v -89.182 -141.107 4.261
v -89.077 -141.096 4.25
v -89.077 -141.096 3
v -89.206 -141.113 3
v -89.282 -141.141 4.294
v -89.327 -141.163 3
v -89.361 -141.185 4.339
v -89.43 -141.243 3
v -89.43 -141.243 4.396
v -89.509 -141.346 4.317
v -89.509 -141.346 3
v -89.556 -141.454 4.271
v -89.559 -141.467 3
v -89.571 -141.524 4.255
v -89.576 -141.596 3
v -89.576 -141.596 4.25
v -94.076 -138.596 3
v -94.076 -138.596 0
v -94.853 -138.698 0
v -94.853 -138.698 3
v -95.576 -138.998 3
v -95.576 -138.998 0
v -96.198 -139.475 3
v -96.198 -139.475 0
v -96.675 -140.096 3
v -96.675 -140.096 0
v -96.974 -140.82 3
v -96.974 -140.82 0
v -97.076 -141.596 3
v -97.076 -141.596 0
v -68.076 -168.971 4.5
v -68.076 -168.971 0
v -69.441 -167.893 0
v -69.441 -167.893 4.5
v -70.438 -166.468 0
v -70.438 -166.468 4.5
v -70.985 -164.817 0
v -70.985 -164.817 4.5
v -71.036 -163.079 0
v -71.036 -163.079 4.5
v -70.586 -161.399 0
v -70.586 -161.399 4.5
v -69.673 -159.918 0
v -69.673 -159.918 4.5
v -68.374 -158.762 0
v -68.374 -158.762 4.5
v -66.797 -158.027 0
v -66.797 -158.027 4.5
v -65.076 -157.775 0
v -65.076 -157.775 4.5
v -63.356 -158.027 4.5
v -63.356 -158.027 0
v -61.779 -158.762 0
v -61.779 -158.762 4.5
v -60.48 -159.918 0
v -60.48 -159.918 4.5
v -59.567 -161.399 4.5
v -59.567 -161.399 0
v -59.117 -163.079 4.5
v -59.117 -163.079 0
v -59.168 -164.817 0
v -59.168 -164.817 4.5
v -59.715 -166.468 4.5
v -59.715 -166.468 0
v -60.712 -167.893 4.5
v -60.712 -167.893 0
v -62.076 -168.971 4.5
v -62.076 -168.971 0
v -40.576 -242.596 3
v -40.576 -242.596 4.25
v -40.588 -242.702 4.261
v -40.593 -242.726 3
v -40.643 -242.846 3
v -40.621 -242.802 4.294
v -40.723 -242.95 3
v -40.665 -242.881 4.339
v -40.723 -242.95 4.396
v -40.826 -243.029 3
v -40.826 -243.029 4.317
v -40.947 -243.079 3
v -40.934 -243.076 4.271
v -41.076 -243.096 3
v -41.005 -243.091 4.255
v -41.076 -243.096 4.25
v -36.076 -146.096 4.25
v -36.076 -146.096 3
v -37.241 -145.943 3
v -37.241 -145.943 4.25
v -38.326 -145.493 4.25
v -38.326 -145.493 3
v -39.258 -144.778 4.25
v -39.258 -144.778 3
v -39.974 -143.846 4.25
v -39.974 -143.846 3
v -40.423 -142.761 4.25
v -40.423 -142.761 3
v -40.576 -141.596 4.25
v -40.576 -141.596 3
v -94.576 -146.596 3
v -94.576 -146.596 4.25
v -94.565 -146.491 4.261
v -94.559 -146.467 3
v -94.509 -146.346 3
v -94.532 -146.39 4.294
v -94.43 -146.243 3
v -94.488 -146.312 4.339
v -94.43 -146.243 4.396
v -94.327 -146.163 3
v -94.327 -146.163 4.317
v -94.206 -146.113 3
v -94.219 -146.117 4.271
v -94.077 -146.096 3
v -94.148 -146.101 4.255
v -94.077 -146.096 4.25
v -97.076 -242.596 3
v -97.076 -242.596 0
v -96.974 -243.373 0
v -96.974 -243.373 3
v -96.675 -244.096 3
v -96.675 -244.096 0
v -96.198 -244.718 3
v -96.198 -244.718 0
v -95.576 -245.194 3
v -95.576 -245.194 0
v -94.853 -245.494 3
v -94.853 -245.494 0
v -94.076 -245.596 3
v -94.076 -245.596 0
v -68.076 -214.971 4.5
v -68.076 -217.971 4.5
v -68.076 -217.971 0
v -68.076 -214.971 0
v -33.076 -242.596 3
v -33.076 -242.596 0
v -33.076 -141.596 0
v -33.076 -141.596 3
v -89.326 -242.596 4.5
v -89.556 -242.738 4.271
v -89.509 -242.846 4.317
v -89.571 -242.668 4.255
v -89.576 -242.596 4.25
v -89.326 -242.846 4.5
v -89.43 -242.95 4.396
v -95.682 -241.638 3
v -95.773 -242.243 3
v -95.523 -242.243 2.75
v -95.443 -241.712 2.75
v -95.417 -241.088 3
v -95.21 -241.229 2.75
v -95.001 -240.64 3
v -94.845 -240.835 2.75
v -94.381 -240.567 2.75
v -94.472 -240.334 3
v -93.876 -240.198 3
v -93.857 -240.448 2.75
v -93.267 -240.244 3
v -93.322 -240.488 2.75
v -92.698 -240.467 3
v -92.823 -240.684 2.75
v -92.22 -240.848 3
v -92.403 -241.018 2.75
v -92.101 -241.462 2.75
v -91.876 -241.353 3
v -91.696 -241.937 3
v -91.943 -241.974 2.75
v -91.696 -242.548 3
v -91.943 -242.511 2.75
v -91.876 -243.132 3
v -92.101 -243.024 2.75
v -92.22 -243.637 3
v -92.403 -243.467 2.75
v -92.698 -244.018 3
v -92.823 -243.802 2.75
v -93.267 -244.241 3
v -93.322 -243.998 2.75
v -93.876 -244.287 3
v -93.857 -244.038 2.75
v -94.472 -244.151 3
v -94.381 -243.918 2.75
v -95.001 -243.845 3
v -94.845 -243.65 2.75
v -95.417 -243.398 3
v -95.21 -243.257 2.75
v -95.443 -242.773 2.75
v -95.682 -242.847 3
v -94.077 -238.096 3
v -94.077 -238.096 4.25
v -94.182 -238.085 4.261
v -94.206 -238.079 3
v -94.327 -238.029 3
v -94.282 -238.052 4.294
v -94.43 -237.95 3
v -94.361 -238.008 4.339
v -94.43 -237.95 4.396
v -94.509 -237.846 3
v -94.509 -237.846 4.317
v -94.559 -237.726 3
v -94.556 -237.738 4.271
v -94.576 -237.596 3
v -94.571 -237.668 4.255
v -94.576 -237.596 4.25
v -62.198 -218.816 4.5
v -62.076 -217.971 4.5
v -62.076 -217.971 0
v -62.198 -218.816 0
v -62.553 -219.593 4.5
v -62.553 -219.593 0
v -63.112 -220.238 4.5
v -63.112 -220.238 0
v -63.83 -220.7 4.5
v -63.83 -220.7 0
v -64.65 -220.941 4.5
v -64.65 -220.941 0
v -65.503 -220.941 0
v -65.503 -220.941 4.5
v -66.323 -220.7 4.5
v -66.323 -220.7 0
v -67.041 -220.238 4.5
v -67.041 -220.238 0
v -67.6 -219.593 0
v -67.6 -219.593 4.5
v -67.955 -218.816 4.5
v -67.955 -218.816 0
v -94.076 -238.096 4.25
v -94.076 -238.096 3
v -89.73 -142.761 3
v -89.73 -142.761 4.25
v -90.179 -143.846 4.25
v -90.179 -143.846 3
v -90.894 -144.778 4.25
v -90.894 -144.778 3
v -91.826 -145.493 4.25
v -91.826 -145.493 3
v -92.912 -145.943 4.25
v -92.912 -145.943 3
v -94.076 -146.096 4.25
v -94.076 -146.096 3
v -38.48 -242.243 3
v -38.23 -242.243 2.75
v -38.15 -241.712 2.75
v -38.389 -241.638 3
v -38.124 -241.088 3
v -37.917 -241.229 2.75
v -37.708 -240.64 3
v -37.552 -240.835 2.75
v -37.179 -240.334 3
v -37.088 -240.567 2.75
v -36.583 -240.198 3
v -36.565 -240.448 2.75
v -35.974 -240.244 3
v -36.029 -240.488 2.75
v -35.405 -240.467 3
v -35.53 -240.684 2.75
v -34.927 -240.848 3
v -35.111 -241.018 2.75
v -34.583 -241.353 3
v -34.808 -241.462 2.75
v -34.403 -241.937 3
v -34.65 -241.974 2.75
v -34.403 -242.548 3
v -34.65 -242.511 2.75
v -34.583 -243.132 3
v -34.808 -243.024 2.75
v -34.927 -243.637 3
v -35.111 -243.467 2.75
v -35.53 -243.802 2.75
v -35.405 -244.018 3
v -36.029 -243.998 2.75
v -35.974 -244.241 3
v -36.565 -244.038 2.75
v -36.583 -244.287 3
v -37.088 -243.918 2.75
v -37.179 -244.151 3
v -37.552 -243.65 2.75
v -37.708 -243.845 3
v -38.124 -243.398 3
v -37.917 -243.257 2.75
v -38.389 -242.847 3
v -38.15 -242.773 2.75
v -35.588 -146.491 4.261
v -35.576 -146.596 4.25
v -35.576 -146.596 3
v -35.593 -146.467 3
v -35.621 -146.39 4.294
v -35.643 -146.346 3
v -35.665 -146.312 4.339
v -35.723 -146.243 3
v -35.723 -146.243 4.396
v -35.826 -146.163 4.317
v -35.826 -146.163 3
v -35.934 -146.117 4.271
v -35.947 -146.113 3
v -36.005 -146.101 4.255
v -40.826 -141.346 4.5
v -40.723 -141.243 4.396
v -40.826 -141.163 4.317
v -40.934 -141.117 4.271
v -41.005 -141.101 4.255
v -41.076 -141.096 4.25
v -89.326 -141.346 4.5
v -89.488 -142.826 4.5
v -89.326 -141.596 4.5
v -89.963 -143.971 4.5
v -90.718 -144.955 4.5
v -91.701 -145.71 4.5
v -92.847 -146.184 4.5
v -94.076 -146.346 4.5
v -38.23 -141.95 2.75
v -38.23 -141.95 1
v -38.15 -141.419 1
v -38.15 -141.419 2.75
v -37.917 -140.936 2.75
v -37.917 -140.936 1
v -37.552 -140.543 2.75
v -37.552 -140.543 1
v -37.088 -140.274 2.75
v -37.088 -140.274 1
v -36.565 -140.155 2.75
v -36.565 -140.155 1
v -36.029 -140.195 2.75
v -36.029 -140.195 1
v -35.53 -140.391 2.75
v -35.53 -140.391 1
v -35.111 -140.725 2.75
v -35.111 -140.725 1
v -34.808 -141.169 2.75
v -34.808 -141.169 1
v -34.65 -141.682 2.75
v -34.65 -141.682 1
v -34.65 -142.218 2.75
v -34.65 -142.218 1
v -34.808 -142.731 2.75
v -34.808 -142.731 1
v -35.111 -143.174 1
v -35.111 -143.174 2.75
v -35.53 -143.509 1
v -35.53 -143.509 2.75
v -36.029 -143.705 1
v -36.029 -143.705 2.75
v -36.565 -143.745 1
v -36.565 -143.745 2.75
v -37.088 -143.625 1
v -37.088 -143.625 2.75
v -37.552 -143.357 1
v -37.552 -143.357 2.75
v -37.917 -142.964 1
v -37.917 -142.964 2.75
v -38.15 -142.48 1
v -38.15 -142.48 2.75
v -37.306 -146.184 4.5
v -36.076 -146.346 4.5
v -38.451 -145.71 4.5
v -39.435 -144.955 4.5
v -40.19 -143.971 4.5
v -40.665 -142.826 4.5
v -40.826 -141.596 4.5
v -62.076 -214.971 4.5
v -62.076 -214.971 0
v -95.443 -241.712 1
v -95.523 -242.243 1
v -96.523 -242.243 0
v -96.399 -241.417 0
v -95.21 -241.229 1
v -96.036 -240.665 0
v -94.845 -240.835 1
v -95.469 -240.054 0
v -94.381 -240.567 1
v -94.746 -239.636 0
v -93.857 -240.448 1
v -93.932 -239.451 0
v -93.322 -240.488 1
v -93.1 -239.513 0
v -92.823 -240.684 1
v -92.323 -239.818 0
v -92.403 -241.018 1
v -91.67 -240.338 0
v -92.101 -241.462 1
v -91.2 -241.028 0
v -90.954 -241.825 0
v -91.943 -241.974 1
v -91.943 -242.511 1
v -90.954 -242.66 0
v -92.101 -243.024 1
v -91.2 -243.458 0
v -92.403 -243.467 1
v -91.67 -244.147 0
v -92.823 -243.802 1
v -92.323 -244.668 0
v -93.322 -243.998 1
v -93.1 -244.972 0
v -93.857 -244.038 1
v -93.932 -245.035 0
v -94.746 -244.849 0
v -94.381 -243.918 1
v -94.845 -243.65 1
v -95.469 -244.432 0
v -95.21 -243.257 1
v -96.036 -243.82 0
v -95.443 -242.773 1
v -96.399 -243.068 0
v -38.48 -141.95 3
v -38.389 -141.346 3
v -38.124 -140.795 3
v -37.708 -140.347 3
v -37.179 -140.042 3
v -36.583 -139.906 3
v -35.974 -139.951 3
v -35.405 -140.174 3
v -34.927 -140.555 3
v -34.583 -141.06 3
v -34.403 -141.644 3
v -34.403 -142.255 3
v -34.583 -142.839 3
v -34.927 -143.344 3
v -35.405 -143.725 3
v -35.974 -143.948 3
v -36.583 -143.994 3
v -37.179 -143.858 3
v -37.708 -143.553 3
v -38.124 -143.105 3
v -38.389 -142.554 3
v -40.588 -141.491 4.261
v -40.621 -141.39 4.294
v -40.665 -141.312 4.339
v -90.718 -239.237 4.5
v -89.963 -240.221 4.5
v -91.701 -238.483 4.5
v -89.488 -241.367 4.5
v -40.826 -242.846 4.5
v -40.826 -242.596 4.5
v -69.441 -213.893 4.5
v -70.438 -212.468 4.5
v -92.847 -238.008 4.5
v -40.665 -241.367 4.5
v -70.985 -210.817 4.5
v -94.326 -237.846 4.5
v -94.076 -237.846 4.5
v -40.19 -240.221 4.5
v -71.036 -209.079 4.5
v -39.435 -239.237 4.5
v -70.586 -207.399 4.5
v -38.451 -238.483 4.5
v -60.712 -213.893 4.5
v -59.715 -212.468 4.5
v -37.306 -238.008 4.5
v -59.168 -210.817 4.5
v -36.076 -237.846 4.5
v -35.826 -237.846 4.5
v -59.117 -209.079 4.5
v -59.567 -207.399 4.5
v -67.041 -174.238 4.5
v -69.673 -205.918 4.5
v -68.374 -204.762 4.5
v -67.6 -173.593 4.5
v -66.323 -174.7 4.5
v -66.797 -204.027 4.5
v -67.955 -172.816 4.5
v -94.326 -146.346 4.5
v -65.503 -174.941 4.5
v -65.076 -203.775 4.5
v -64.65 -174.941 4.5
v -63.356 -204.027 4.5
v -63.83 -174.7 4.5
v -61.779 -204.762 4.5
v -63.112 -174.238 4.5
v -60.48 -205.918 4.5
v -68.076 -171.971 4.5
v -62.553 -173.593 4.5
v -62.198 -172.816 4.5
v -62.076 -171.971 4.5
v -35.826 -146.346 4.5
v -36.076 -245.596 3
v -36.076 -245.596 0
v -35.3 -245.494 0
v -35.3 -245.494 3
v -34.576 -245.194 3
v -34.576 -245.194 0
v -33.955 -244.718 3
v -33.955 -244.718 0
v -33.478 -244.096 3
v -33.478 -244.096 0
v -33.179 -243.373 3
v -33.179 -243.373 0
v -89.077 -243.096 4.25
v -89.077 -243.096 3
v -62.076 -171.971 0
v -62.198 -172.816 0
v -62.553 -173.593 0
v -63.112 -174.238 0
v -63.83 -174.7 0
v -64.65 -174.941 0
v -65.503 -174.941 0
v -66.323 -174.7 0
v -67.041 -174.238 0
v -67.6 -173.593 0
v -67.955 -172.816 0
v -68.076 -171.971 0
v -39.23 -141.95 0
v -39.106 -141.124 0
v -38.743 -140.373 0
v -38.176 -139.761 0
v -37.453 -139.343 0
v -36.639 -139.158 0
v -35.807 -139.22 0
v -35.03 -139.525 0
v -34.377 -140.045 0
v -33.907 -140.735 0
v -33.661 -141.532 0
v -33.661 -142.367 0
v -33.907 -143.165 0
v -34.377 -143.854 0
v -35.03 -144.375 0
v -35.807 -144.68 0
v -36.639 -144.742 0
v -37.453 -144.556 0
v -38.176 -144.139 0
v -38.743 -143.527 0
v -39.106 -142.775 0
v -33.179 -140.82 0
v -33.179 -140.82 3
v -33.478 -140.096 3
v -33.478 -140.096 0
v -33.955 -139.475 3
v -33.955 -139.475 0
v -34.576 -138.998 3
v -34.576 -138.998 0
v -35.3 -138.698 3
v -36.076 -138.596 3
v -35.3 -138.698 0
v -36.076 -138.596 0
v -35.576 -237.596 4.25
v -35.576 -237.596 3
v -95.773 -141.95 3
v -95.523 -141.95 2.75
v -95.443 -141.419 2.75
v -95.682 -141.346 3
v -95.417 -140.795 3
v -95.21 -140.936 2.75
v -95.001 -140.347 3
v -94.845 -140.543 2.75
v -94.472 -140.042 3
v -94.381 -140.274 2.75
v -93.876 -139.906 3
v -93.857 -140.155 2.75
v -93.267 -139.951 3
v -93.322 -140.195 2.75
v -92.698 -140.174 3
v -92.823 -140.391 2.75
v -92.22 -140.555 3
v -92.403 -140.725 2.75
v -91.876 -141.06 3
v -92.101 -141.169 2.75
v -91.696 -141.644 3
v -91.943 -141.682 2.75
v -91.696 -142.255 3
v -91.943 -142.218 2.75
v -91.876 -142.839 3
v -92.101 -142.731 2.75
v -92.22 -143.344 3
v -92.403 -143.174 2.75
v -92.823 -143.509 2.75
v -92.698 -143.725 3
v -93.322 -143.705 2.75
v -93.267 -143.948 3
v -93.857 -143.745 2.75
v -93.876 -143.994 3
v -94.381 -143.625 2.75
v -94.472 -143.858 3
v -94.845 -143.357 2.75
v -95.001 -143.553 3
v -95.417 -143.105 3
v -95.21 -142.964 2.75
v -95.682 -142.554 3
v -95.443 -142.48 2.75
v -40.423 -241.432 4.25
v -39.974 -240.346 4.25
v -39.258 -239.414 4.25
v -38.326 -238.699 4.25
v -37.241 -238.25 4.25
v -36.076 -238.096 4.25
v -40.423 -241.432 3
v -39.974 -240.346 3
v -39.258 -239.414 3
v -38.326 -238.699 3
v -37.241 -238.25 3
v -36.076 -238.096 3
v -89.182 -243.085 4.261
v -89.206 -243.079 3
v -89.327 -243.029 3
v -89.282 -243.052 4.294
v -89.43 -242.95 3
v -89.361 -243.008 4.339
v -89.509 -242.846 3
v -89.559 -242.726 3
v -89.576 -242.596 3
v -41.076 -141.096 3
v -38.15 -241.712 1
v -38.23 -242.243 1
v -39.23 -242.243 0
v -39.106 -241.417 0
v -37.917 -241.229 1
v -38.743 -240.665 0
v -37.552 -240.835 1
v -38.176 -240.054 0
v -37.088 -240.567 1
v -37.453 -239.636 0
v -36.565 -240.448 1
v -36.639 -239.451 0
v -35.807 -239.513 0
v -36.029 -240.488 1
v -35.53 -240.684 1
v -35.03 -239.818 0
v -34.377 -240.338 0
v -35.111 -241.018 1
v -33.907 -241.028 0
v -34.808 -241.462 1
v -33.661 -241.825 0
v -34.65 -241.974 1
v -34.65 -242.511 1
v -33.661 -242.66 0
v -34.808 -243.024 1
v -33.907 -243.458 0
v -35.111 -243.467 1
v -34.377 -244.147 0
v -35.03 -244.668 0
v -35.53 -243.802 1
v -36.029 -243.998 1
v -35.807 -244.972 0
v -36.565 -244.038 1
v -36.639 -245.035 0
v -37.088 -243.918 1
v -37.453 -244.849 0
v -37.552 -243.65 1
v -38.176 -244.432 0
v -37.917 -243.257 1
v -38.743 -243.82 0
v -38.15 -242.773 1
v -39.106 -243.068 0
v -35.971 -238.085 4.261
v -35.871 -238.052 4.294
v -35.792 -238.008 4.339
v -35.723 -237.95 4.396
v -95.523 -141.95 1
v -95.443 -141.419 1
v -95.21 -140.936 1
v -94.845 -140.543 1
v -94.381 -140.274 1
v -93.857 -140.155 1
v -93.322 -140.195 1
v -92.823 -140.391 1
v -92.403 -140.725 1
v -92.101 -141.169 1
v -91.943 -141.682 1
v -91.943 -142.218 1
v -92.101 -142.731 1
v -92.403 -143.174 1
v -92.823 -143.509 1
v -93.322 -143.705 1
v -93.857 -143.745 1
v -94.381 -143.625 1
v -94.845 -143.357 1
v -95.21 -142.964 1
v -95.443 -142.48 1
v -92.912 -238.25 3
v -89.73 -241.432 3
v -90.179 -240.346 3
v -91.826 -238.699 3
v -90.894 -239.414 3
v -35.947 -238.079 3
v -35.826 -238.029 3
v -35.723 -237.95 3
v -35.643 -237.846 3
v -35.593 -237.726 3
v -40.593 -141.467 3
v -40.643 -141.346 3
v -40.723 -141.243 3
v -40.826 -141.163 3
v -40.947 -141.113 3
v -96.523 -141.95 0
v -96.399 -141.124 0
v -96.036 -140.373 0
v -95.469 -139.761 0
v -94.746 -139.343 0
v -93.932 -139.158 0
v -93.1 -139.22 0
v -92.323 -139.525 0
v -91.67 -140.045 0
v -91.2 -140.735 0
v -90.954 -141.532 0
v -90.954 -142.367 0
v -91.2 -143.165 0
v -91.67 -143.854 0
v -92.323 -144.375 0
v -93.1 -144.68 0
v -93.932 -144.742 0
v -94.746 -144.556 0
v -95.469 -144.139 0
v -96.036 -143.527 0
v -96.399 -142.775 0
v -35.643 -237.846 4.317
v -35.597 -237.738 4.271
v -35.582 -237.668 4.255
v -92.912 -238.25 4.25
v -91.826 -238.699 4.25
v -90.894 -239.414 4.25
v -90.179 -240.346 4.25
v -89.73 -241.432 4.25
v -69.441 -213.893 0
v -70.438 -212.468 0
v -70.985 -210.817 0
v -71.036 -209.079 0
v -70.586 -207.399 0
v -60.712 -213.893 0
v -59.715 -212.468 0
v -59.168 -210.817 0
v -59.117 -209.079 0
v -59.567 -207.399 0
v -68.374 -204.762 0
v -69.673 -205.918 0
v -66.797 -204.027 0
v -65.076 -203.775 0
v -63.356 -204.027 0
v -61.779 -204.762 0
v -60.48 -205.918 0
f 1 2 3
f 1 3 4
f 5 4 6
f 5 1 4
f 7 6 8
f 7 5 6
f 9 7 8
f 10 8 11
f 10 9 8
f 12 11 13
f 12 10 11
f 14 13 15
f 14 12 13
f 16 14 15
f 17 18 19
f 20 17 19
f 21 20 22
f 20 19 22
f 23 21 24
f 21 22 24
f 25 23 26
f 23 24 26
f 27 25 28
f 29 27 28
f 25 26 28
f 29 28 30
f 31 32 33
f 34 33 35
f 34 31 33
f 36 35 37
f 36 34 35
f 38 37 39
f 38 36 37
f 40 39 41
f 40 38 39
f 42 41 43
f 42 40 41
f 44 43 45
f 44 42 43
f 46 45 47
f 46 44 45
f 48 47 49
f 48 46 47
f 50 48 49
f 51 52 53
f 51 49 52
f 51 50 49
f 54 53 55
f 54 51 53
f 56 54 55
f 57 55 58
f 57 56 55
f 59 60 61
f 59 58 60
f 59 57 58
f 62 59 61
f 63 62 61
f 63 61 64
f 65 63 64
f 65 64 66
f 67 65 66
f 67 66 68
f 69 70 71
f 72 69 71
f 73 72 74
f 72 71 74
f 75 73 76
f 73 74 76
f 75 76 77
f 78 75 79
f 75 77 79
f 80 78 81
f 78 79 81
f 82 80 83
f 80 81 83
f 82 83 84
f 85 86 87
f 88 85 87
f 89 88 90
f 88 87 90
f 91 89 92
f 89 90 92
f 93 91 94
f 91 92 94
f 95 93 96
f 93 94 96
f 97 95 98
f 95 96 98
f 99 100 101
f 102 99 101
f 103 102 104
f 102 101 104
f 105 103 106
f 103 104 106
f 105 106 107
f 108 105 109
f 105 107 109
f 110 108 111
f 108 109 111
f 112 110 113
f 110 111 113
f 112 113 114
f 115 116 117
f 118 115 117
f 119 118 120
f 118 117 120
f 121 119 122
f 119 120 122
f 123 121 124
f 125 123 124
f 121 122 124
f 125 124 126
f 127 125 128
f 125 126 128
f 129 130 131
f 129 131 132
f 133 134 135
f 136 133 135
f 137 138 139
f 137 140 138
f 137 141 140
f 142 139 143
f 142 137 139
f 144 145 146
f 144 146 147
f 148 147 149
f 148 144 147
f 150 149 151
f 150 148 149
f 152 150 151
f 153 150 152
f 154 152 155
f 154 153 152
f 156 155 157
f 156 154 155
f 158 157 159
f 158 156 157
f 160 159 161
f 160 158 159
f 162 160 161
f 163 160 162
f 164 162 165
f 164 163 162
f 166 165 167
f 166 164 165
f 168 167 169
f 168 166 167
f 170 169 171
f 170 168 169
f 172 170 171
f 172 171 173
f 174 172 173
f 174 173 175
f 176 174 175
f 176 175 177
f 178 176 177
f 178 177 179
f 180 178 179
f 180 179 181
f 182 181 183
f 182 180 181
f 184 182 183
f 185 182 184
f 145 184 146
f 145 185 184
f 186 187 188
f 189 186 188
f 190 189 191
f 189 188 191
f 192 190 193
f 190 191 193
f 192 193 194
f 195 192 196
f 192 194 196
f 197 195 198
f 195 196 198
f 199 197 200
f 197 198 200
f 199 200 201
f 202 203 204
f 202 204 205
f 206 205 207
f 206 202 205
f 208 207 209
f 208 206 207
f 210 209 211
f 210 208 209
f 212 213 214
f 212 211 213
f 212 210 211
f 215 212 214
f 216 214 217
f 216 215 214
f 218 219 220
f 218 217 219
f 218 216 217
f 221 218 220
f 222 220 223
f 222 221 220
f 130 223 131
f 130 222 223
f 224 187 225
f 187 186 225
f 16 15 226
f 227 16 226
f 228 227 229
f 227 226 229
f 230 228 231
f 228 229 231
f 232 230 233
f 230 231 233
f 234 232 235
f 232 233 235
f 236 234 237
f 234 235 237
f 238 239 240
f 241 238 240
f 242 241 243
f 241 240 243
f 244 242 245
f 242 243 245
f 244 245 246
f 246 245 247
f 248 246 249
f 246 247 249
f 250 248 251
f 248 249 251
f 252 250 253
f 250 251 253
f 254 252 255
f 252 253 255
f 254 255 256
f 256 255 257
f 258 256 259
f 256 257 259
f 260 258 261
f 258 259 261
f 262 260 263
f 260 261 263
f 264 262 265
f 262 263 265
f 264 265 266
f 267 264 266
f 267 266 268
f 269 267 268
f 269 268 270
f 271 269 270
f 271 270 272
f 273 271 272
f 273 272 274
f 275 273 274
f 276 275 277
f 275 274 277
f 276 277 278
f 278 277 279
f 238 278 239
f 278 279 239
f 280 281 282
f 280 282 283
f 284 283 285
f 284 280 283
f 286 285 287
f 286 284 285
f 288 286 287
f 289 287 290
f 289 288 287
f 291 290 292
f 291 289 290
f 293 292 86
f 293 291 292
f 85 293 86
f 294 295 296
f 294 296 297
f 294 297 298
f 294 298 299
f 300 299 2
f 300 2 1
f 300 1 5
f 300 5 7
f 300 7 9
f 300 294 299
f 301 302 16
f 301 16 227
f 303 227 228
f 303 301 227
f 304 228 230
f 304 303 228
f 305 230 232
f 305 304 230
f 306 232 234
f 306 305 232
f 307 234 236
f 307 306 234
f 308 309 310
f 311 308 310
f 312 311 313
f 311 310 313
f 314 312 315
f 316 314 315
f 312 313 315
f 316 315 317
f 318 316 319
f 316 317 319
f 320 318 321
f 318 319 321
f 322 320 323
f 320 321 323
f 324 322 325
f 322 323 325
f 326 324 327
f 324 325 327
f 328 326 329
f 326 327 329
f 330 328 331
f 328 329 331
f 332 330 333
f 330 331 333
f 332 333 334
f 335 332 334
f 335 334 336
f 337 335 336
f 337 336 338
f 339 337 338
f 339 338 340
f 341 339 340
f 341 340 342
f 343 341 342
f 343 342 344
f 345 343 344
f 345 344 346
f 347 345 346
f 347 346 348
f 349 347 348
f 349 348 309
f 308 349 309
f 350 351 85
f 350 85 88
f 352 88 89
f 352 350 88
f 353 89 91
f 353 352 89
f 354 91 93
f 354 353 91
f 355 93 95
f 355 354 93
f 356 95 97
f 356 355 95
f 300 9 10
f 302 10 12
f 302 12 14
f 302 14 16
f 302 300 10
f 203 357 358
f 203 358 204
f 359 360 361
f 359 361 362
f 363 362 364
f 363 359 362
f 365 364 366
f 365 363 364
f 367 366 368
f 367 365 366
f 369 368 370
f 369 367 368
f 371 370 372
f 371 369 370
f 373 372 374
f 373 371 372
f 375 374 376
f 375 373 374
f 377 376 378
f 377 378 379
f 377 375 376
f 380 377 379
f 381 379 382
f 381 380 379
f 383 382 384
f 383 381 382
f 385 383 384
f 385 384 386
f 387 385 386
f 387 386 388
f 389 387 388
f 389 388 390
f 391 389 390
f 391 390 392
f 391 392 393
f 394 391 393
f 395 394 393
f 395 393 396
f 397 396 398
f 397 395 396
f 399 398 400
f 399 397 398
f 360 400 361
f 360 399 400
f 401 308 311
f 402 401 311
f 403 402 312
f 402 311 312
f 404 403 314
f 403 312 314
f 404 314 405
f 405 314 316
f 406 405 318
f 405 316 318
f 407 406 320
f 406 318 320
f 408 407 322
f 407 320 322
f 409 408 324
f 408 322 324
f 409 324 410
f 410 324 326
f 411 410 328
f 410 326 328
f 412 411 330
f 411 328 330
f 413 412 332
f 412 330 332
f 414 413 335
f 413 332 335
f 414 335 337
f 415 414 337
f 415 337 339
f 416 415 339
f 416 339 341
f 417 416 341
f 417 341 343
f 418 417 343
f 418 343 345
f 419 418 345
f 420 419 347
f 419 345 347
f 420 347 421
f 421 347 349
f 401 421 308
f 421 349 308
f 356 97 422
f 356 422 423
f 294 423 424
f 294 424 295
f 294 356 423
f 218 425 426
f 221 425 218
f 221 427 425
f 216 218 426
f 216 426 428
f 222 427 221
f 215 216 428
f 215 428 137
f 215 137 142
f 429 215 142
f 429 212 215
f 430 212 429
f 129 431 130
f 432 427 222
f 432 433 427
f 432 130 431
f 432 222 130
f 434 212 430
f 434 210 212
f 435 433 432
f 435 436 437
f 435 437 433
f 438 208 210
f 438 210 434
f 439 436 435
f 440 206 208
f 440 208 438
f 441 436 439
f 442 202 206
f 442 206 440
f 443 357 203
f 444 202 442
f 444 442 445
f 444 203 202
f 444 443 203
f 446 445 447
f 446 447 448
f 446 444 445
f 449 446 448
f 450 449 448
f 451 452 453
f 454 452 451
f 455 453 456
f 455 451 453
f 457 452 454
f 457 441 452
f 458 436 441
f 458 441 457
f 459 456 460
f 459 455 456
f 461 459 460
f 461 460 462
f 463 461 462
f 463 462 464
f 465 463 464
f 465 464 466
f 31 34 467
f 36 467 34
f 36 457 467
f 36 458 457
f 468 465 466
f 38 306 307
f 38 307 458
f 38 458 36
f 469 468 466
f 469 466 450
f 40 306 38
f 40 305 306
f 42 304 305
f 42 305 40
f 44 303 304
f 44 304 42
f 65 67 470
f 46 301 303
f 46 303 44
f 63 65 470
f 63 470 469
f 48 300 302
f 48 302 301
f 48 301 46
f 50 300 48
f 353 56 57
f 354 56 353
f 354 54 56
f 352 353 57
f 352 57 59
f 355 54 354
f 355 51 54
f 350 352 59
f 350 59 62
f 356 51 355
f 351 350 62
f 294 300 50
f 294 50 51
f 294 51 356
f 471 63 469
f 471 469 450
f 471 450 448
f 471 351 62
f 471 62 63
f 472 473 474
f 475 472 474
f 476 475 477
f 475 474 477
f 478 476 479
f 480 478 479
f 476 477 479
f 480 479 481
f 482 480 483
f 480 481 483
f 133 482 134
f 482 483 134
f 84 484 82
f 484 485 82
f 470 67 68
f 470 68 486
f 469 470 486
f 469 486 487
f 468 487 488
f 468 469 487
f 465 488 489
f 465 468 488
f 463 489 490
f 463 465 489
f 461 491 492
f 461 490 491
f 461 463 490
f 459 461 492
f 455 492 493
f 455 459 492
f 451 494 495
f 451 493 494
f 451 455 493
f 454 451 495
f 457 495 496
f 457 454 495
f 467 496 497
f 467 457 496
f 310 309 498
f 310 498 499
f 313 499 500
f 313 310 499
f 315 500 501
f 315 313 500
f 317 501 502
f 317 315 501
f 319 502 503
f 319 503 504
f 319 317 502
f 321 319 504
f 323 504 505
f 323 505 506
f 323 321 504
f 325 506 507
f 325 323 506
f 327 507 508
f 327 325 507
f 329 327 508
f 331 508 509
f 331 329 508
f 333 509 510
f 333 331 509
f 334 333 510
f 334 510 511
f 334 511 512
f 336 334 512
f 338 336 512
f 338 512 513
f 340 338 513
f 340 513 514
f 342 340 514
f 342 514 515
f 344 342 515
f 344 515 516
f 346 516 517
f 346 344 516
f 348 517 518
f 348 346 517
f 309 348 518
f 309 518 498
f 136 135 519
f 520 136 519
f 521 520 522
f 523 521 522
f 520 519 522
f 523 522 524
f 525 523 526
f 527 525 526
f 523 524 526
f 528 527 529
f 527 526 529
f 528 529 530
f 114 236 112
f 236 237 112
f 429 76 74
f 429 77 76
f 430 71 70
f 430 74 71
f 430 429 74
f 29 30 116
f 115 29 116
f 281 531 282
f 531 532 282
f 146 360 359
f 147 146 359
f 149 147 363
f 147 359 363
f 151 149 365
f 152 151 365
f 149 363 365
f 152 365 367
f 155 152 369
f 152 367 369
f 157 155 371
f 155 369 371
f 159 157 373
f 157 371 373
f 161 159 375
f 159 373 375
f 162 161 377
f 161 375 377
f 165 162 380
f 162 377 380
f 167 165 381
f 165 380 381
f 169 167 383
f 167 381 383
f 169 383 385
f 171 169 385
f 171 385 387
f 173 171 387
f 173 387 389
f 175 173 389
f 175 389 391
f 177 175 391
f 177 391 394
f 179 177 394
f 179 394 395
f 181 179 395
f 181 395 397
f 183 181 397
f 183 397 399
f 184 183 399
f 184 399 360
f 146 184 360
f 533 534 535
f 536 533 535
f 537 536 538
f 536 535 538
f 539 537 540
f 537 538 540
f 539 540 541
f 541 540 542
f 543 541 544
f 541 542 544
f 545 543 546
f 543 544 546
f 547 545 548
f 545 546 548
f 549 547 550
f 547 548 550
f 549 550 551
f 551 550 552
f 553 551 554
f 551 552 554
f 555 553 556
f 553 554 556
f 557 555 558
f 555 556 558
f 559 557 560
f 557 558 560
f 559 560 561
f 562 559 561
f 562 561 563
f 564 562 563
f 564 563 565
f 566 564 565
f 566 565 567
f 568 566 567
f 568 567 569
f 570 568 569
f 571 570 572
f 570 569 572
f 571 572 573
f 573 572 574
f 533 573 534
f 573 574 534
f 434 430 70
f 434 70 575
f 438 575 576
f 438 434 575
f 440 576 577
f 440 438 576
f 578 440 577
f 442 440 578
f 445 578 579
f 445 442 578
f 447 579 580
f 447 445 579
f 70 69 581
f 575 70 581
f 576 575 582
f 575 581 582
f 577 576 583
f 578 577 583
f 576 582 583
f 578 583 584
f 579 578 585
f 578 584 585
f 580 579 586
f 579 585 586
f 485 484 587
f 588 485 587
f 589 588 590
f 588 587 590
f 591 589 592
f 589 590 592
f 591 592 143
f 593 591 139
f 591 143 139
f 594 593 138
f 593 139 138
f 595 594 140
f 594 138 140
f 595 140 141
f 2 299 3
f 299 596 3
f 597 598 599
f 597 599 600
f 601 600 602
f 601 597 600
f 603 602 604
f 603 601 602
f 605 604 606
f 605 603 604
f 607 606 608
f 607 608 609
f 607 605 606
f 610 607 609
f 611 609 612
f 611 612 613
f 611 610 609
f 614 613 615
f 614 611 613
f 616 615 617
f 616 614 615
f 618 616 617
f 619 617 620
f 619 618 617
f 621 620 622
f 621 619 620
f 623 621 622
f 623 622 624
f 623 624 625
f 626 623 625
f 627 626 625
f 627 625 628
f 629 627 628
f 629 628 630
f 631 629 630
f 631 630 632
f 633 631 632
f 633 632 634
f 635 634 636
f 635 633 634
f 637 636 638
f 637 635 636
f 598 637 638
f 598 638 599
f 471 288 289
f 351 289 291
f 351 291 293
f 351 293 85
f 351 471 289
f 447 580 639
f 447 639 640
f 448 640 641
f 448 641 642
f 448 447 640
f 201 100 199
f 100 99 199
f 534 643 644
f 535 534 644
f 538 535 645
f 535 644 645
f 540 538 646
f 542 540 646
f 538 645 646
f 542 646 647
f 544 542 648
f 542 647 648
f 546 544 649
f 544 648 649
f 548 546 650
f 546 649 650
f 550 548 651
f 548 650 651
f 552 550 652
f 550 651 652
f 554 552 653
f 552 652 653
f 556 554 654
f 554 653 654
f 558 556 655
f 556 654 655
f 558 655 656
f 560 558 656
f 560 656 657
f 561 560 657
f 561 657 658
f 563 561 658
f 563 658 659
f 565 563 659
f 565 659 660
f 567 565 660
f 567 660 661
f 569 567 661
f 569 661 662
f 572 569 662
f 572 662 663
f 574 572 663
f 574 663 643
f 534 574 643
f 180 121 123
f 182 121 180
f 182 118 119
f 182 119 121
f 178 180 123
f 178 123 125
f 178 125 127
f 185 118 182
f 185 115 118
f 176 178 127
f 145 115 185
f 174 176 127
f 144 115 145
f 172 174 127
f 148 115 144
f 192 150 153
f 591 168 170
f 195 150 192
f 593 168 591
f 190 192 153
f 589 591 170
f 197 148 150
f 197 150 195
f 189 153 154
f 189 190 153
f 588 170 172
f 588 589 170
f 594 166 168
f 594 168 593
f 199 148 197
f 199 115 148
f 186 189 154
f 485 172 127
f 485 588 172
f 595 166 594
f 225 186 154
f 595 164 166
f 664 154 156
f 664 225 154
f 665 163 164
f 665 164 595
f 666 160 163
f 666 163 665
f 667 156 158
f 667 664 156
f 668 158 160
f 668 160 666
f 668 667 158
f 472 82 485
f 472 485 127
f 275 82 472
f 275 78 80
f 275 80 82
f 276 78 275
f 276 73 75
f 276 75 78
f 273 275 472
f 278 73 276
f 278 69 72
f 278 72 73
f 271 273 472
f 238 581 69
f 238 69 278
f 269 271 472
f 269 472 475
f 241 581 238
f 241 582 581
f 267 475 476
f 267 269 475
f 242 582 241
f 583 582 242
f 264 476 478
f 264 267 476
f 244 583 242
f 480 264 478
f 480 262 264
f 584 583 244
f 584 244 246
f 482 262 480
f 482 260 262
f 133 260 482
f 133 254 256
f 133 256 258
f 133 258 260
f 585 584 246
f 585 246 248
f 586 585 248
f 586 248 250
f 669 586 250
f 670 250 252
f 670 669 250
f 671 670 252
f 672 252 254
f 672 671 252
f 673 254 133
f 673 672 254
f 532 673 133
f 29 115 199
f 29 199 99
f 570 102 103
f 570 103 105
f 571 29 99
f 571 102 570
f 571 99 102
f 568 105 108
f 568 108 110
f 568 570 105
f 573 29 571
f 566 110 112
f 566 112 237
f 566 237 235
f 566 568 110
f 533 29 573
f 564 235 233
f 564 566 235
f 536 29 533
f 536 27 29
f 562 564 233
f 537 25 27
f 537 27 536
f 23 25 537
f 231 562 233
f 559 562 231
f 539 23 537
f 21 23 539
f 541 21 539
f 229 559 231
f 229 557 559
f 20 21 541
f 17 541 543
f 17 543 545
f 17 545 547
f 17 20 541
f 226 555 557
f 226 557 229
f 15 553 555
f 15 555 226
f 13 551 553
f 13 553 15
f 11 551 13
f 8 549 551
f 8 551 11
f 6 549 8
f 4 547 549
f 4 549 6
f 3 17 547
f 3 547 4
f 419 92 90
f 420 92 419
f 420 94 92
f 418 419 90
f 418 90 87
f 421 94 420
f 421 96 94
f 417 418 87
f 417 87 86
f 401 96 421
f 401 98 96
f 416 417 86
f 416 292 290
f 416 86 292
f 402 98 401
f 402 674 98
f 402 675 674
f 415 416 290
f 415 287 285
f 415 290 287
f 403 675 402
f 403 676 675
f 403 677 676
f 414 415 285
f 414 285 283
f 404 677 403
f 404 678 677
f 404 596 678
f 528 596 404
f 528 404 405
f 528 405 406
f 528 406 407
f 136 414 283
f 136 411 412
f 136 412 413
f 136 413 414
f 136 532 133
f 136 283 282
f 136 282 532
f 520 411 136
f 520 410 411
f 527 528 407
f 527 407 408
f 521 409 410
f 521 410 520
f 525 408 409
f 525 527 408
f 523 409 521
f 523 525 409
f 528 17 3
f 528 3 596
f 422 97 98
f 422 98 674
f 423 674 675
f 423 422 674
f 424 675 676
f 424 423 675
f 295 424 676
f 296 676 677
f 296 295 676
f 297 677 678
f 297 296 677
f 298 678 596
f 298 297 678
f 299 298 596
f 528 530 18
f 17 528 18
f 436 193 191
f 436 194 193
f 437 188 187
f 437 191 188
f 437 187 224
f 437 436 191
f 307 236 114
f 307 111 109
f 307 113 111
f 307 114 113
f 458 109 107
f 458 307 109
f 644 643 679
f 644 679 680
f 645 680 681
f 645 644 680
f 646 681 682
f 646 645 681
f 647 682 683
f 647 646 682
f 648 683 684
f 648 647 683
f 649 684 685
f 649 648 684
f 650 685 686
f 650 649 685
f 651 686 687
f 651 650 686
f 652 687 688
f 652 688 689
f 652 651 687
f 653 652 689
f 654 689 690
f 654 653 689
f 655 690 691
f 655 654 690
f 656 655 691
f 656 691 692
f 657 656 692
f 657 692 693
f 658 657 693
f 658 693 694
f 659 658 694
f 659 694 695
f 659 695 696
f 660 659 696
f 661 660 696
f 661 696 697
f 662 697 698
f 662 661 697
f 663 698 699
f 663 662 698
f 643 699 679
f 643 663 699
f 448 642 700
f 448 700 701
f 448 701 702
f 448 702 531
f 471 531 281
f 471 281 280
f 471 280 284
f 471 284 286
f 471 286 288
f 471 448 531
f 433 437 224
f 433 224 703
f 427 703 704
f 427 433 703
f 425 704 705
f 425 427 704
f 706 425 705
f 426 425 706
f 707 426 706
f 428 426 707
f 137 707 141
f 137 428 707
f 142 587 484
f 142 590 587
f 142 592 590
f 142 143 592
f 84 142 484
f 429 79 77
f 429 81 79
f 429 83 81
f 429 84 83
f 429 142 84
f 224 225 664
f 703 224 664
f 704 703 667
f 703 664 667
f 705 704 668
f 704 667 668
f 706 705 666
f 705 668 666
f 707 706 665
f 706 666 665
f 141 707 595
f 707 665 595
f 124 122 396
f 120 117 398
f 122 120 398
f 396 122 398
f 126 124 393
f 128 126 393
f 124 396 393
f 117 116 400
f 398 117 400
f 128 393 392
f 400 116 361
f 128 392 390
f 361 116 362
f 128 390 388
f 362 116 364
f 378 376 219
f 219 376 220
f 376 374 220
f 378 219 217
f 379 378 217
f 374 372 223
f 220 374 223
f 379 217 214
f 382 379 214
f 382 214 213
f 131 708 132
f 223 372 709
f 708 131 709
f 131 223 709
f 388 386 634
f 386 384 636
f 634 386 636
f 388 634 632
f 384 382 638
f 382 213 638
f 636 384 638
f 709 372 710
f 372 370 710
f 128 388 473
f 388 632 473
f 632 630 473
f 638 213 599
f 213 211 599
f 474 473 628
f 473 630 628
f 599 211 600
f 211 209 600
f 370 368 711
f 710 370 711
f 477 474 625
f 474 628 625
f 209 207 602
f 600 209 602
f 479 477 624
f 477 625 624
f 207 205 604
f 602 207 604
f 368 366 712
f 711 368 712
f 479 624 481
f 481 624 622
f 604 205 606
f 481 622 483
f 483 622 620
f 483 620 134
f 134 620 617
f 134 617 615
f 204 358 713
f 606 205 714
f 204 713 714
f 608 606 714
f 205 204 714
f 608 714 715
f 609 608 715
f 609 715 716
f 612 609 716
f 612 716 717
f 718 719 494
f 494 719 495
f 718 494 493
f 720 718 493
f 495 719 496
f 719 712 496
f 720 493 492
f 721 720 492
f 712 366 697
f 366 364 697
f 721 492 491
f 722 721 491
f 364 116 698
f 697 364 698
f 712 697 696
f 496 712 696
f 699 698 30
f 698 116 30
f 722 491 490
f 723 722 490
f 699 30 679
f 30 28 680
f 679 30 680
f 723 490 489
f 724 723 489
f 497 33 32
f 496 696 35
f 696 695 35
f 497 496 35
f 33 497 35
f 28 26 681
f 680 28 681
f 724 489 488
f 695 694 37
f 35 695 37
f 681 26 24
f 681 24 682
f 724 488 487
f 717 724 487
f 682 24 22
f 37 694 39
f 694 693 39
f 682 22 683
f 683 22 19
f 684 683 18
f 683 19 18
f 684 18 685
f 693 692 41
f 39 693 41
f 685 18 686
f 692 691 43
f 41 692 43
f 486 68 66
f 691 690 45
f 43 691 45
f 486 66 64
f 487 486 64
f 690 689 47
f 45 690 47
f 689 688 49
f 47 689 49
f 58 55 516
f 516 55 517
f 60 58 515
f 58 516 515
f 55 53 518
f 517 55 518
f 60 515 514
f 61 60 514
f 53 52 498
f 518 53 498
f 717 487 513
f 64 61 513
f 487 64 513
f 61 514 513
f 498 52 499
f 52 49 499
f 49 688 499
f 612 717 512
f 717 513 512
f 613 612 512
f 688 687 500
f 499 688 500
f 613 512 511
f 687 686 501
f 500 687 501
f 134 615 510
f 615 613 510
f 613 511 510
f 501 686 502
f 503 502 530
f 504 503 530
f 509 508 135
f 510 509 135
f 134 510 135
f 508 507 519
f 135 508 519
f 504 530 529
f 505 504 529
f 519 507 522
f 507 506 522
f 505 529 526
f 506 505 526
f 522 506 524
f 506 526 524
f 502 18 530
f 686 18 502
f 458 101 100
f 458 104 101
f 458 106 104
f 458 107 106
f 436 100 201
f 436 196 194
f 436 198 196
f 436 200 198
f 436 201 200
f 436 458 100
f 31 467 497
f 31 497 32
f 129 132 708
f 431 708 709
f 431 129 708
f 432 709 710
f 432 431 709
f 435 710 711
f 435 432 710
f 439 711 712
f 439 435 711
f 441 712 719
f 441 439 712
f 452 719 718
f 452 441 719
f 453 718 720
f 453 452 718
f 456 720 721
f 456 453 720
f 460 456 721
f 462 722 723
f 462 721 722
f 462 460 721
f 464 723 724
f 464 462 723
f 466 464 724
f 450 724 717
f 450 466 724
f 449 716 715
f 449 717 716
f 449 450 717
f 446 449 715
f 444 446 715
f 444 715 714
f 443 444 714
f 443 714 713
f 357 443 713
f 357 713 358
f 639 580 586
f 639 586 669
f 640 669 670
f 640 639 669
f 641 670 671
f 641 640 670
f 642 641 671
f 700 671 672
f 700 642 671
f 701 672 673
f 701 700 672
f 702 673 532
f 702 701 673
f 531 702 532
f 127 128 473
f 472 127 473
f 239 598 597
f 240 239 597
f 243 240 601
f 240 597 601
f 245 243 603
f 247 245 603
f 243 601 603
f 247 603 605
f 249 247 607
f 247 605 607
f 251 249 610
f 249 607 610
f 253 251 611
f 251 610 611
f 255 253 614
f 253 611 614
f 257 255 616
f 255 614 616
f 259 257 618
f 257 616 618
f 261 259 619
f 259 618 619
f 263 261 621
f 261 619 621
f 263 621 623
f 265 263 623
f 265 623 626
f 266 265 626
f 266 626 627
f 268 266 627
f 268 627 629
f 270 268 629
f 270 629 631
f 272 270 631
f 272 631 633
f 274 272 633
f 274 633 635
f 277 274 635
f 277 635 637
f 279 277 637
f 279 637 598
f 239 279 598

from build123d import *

# Parameters (mm, degrees)
BOSS_EXTRU_1_DEPTH      = 3
BOSS_EXTRU_2_DEPTH      = 1.5
ENL_V_MAT_EXTRU_1_REACH = 266.124
ESQUISSE7_R             = 1.8
CHANFREIN1_SIZE         = 1
CHANFREIN2_SIZE         = 0.25
CONG_1_R                = 0.5
ENL_V_MAT_EXTRU_2_DEPTH = 265.124225417


with BuildPart() as part:
    # Esquisse1 → Boss.-Extru.1 (new body)
    with BuildSketch(Plane.XY):
        with BuildLine():
            Line((-33.076462524, -242.596247682), (-33.076462524, -141.596247682))
            ThreePointArc((-33.076462524, -141.596247682), (-33.955142181, -139.474927339), (-36.076462524, -138.596247682))
            Line((-36.076462524, -138.596247682), (-94.076462524, -138.596247682))
            ThreePointArc((-94.076462524, -138.596247682), (-96.197782868, -139.474927339), (-97.076462524, -141.596247682))
            Line((-97.076462524, -141.596247682), (-97.076462524, -242.596247682))
            ThreePointArc((-97.076462524, -242.596247682), (-96.197782868, -244.717568026), (-94.076462524, -245.596247682))
            Line((-94.076462524, -245.596247682), (-36.076462524, -245.596247682))
            ThreePointArc((-36.076462524, -245.596247682), (-33.955142181, -244.717568026), (-33.076462524, -242.596247682))
        make_face()
    extrude(amount=BOSS_EXTRU_1_DEPTH)

    # Esquisse5 → Boss.-Extru.2 (add)
    with BuildSketch(Plane.XY.offset(3)):
        with BuildLine():
            Line((-40.576462524, -243.096247682), (-40.576462524, -242.596247682))
            ThreePointArc((-40.576462524, -242.596247682), (-39.25844304, -239.414267167), (-36.076462524, -238.096247682))
            Line((-36.076462524, -238.096247682), (-35.576462524, -238.096247682))
            Line((-35.576462524, -238.096247682), (-35.576462524, -146.096247682))
            Line((-35.576462524, -146.096247682), (-36.076462524, -146.096247682))
            ThreePointArc((-36.076462524, -146.096247682), (-39.25844304, -144.778228198), (-40.576462524, -141.596247682))
            Line((-40.576462524, -141.596247682), (-40.576462524, -141.096247682))
            Line((-40.576462524, -141.096247682), (-89.576462524, -141.096247682))
            Line((-89.576462524, -141.096247682), (-89.576462524, -141.596247682))
            ThreePointArc((-89.576462524, -141.596247682), (-90.894482009, -144.778228198), (-94.076462524, -146.096247682))
            Line((-94.076462524, -146.096247682), (-94.576462524, -146.096247682))
            Line((-94.576462524, -146.096247682), (-94.576462524, -238.096247682))
            Line((-94.576462524, -238.096247682), (-94.076462524, -238.096247682))
            ThreePointArc((-94.076462524, -238.096247682), (-90.894482009, -239.414267167), (-89.576462524, -242.596247682))
            Line((-89.576462524, -242.596247682), (-89.576462524, -243.096247682))
            Line((-89.576462524, -243.096247682), (-40.576462524, -243.096247682))
        make_face()
    extrude(amount=BOSS_EXTRU_2_DEPTH)

    # Esquisse7 → Enlèv. mat.-Extru.1 (cut, up to next)
    with BuildSketch(Plane(origin=(0, 0, 0), x_dir=(-1, 0, 0), z_dir=(0, 0, -1)), mode=Mode.PRIVATE) as enl_v_mat_extru_1_sk1:
        with Locations((93.722909134, -242.242694292)):
            Circle(ESQUISSE7_R)
    enl_v_mat_extru_1_tool1 = extrude(enl_v_mat_extru_1_sk1.sketch, amount=-ENL_V_MAT_EXTRU_1_REACH, mode=Mode.PRIVATE) & part.part
    # Esquisse7 → Enlèv. mat.-Extru.1 (cut, up to next)
    with BuildSketch(Plane(origin=(0, 0, 0), x_dir=(-1, 0, 0), z_dir=(0, 0, -1)), mode=Mode.PRIVATE) as enl_v_mat_extru_1_sk2:
        with Locations((93.722909134, -141.949801073)):
            Circle(ESQUISSE7_R)
    enl_v_mat_extru_1_tool2 = extrude(enl_v_mat_extru_1_sk2.sketch, amount=-ENL_V_MAT_EXTRU_1_REACH, mode=Mode.PRIVATE) & part.part
    # Esquisse7 → Enlèv. mat.-Extru.1 (cut, up to next)
    with BuildSketch(Plane(origin=(0, 0, 0), x_dir=(-1, 0, 0), z_dir=(0, 0, -1)), mode=Mode.PRIVATE) as enl_v_mat_extru_1_sk3:
        with Locations((36.430015915, -141.949801073)):
            Circle(ESQUISSE7_R)
    enl_v_mat_extru_1_tool3 = extrude(enl_v_mat_extru_1_sk3.sketch, amount=-ENL_V_MAT_EXTRU_1_REACH, mode=Mode.PRIVATE) & part.part
    # Esquisse7 → Enlèv. mat.-Extru.1 (cut, up to next)
    with BuildSketch(Plane(origin=(0, 0, 0), x_dir=(-1, 0, 0), z_dir=(0, 0, -1)), mode=Mode.PRIVATE) as enl_v_mat_extru_1_sk4:
        with Locations((36.430015915, -242.242694292)):
            Circle(ESQUISSE7_R)
    enl_v_mat_extru_1_tool4 = extrude(enl_v_mat_extru_1_sk4.sketch, amount=-ENL_V_MAT_EXTRU_1_REACH, mode=Mode.PRIVATE) & part.part
    add(enl_v_mat_extru_1_tool1.solids().sort_by_distance((-93.722909, -242.242694, 0))[0], mode=Mode.SUBTRACT)
    add(enl_v_mat_extru_1_tool2.solids().sort_by_distance((-93.722909, -141.949801, 0))[0], mode=Mode.SUBTRACT)
    add(enl_v_mat_extru_1_tool3.solids().sort_by_distance((-36.430016, -141.949801, 0))[0], mode=Mode.SUBTRACT)
    add(enl_v_mat_extru_1_tool4.solids().sort_by_distance((-36.430016, -242.242694, 0))[0], mode=Mode.SUBTRACT)

    # Chanfrein1
    chanfrein1_edges = [part.edges().sort_by_distance(p)[0] for p in [
        (-91.922909134, -242.242694292, 0),
        (-91.922909134, -141.949801073, 0),
        (-34.630015915, -141.949801073, 0),
        (-34.630015915, -242.242694292, 0),
    ]]
    chamfer(chanfrein1_edges, length=CHANFREIN1_SIZE)

    # Chanfrein2
    chanfrein2_edges = [part.edges().sort_by_distance(p)[0] for p in [
        (-65.076462524, -243.096247682, 4.5),
        (-40.576462524, -242.846247682, 4.5),
        (-39.25844304, -239.414267167, 4.5),
        (-35.826462524, -238.096247682, 4.5),
        (-35.576462524, -192.096247682, 4.5),
        (-35.826462524, -146.096247682, 4.5),
        (-39.25844304, -144.778228198, 4.5),
        (-40.576462524, -141.346247682, 4.5),
        (-65.076462524, -141.096247682, 4.5),
        (-89.576462524, -141.346247682, 4.5),
        (-90.894482009, -144.778228198, 4.5),
        (-94.326462524, -146.096247682, 4.5),
        (-94.576462524, -192.096247682, 4.5),
        (-94.326462524, -238.096247682, 4.5),
        (-90.894482009, -239.414267167, 4.5),
        (-89.576462524, -242.846247682, 4.5),
        (-91.922909134, -242.242694292, 3),
        (-91.922909134, -141.949801073, 3),
        (-34.630015915, -141.949801073, 3),
        (-34.630015915, -242.242694292, 3),
    ]]
    chamfer(chanfrein2_edges, length=CHANFREIN2_SIZE)

    # Congé1
    cong_1_edges = [part.edges().sort_by_distance(p)[0] for p in [
        (-94.576462524, -238.096247682, 3.625),
        (-89.576462524, -243.096247682, 3.625),
        (-35.576462524, -146.096247682, 3.625),
        (-40.576462524, -141.096247682, 3.625),
        (-89.576462524, -141.096247682, 3.625),
        (-94.576462524, -146.096247682, 3.625),
        (-35.576462524, -238.096247682, 3.625),
        (-40.576462524, -243.096247682, 3.625),
    ]]
    fillet(cong_1_edges, radius=CONG_1_R - 0.0001)  # a hair under: the kernel refuses the full size

    # Esquisse8 → Enlèv. mat.-Extru.2 (cut, through all)
    with BuildSketch(Plane.XY.offset(4.5)):
        with BuildLine():
            Line((-68.076462524, -171.971247682), (-68.076462524, -168.971247682))
            ThreePointArc((-68.076462524, -168.971247682), (-65.076462524, -157.77509526), (-62.076462524, -168.971247682))
            Line((-62.076462524, -168.971247682), (-62.076462524, -171.971247682))
            ThreePointArc((-62.076462524, -171.971247682), (-65.076462524, -174.971247682), (-68.076462524, -171.971247682))
        make_face()
        with BuildLine():
            Line((-68.076462524, -217.971247682), (-68.076462524, -214.971247682))
            ThreePointArc((-68.076462524, -214.971247682), (-65.076462524, -203.77509526), (-62.076462524, -214.971247682))
            Line((-62.076462524, -214.971247682), (-62.076462524, -217.971247682))
            ThreePointArc((-62.076462524, -217.971247682), (-65.076462524, -220.971247682), (-68.076462524, -217.971247682))
        make_face()
    extrude(amount=-ENL_V_MAT_EXTRU_2_DEPTH, mode=Mode.SUBTRACT)


solid = part.part
